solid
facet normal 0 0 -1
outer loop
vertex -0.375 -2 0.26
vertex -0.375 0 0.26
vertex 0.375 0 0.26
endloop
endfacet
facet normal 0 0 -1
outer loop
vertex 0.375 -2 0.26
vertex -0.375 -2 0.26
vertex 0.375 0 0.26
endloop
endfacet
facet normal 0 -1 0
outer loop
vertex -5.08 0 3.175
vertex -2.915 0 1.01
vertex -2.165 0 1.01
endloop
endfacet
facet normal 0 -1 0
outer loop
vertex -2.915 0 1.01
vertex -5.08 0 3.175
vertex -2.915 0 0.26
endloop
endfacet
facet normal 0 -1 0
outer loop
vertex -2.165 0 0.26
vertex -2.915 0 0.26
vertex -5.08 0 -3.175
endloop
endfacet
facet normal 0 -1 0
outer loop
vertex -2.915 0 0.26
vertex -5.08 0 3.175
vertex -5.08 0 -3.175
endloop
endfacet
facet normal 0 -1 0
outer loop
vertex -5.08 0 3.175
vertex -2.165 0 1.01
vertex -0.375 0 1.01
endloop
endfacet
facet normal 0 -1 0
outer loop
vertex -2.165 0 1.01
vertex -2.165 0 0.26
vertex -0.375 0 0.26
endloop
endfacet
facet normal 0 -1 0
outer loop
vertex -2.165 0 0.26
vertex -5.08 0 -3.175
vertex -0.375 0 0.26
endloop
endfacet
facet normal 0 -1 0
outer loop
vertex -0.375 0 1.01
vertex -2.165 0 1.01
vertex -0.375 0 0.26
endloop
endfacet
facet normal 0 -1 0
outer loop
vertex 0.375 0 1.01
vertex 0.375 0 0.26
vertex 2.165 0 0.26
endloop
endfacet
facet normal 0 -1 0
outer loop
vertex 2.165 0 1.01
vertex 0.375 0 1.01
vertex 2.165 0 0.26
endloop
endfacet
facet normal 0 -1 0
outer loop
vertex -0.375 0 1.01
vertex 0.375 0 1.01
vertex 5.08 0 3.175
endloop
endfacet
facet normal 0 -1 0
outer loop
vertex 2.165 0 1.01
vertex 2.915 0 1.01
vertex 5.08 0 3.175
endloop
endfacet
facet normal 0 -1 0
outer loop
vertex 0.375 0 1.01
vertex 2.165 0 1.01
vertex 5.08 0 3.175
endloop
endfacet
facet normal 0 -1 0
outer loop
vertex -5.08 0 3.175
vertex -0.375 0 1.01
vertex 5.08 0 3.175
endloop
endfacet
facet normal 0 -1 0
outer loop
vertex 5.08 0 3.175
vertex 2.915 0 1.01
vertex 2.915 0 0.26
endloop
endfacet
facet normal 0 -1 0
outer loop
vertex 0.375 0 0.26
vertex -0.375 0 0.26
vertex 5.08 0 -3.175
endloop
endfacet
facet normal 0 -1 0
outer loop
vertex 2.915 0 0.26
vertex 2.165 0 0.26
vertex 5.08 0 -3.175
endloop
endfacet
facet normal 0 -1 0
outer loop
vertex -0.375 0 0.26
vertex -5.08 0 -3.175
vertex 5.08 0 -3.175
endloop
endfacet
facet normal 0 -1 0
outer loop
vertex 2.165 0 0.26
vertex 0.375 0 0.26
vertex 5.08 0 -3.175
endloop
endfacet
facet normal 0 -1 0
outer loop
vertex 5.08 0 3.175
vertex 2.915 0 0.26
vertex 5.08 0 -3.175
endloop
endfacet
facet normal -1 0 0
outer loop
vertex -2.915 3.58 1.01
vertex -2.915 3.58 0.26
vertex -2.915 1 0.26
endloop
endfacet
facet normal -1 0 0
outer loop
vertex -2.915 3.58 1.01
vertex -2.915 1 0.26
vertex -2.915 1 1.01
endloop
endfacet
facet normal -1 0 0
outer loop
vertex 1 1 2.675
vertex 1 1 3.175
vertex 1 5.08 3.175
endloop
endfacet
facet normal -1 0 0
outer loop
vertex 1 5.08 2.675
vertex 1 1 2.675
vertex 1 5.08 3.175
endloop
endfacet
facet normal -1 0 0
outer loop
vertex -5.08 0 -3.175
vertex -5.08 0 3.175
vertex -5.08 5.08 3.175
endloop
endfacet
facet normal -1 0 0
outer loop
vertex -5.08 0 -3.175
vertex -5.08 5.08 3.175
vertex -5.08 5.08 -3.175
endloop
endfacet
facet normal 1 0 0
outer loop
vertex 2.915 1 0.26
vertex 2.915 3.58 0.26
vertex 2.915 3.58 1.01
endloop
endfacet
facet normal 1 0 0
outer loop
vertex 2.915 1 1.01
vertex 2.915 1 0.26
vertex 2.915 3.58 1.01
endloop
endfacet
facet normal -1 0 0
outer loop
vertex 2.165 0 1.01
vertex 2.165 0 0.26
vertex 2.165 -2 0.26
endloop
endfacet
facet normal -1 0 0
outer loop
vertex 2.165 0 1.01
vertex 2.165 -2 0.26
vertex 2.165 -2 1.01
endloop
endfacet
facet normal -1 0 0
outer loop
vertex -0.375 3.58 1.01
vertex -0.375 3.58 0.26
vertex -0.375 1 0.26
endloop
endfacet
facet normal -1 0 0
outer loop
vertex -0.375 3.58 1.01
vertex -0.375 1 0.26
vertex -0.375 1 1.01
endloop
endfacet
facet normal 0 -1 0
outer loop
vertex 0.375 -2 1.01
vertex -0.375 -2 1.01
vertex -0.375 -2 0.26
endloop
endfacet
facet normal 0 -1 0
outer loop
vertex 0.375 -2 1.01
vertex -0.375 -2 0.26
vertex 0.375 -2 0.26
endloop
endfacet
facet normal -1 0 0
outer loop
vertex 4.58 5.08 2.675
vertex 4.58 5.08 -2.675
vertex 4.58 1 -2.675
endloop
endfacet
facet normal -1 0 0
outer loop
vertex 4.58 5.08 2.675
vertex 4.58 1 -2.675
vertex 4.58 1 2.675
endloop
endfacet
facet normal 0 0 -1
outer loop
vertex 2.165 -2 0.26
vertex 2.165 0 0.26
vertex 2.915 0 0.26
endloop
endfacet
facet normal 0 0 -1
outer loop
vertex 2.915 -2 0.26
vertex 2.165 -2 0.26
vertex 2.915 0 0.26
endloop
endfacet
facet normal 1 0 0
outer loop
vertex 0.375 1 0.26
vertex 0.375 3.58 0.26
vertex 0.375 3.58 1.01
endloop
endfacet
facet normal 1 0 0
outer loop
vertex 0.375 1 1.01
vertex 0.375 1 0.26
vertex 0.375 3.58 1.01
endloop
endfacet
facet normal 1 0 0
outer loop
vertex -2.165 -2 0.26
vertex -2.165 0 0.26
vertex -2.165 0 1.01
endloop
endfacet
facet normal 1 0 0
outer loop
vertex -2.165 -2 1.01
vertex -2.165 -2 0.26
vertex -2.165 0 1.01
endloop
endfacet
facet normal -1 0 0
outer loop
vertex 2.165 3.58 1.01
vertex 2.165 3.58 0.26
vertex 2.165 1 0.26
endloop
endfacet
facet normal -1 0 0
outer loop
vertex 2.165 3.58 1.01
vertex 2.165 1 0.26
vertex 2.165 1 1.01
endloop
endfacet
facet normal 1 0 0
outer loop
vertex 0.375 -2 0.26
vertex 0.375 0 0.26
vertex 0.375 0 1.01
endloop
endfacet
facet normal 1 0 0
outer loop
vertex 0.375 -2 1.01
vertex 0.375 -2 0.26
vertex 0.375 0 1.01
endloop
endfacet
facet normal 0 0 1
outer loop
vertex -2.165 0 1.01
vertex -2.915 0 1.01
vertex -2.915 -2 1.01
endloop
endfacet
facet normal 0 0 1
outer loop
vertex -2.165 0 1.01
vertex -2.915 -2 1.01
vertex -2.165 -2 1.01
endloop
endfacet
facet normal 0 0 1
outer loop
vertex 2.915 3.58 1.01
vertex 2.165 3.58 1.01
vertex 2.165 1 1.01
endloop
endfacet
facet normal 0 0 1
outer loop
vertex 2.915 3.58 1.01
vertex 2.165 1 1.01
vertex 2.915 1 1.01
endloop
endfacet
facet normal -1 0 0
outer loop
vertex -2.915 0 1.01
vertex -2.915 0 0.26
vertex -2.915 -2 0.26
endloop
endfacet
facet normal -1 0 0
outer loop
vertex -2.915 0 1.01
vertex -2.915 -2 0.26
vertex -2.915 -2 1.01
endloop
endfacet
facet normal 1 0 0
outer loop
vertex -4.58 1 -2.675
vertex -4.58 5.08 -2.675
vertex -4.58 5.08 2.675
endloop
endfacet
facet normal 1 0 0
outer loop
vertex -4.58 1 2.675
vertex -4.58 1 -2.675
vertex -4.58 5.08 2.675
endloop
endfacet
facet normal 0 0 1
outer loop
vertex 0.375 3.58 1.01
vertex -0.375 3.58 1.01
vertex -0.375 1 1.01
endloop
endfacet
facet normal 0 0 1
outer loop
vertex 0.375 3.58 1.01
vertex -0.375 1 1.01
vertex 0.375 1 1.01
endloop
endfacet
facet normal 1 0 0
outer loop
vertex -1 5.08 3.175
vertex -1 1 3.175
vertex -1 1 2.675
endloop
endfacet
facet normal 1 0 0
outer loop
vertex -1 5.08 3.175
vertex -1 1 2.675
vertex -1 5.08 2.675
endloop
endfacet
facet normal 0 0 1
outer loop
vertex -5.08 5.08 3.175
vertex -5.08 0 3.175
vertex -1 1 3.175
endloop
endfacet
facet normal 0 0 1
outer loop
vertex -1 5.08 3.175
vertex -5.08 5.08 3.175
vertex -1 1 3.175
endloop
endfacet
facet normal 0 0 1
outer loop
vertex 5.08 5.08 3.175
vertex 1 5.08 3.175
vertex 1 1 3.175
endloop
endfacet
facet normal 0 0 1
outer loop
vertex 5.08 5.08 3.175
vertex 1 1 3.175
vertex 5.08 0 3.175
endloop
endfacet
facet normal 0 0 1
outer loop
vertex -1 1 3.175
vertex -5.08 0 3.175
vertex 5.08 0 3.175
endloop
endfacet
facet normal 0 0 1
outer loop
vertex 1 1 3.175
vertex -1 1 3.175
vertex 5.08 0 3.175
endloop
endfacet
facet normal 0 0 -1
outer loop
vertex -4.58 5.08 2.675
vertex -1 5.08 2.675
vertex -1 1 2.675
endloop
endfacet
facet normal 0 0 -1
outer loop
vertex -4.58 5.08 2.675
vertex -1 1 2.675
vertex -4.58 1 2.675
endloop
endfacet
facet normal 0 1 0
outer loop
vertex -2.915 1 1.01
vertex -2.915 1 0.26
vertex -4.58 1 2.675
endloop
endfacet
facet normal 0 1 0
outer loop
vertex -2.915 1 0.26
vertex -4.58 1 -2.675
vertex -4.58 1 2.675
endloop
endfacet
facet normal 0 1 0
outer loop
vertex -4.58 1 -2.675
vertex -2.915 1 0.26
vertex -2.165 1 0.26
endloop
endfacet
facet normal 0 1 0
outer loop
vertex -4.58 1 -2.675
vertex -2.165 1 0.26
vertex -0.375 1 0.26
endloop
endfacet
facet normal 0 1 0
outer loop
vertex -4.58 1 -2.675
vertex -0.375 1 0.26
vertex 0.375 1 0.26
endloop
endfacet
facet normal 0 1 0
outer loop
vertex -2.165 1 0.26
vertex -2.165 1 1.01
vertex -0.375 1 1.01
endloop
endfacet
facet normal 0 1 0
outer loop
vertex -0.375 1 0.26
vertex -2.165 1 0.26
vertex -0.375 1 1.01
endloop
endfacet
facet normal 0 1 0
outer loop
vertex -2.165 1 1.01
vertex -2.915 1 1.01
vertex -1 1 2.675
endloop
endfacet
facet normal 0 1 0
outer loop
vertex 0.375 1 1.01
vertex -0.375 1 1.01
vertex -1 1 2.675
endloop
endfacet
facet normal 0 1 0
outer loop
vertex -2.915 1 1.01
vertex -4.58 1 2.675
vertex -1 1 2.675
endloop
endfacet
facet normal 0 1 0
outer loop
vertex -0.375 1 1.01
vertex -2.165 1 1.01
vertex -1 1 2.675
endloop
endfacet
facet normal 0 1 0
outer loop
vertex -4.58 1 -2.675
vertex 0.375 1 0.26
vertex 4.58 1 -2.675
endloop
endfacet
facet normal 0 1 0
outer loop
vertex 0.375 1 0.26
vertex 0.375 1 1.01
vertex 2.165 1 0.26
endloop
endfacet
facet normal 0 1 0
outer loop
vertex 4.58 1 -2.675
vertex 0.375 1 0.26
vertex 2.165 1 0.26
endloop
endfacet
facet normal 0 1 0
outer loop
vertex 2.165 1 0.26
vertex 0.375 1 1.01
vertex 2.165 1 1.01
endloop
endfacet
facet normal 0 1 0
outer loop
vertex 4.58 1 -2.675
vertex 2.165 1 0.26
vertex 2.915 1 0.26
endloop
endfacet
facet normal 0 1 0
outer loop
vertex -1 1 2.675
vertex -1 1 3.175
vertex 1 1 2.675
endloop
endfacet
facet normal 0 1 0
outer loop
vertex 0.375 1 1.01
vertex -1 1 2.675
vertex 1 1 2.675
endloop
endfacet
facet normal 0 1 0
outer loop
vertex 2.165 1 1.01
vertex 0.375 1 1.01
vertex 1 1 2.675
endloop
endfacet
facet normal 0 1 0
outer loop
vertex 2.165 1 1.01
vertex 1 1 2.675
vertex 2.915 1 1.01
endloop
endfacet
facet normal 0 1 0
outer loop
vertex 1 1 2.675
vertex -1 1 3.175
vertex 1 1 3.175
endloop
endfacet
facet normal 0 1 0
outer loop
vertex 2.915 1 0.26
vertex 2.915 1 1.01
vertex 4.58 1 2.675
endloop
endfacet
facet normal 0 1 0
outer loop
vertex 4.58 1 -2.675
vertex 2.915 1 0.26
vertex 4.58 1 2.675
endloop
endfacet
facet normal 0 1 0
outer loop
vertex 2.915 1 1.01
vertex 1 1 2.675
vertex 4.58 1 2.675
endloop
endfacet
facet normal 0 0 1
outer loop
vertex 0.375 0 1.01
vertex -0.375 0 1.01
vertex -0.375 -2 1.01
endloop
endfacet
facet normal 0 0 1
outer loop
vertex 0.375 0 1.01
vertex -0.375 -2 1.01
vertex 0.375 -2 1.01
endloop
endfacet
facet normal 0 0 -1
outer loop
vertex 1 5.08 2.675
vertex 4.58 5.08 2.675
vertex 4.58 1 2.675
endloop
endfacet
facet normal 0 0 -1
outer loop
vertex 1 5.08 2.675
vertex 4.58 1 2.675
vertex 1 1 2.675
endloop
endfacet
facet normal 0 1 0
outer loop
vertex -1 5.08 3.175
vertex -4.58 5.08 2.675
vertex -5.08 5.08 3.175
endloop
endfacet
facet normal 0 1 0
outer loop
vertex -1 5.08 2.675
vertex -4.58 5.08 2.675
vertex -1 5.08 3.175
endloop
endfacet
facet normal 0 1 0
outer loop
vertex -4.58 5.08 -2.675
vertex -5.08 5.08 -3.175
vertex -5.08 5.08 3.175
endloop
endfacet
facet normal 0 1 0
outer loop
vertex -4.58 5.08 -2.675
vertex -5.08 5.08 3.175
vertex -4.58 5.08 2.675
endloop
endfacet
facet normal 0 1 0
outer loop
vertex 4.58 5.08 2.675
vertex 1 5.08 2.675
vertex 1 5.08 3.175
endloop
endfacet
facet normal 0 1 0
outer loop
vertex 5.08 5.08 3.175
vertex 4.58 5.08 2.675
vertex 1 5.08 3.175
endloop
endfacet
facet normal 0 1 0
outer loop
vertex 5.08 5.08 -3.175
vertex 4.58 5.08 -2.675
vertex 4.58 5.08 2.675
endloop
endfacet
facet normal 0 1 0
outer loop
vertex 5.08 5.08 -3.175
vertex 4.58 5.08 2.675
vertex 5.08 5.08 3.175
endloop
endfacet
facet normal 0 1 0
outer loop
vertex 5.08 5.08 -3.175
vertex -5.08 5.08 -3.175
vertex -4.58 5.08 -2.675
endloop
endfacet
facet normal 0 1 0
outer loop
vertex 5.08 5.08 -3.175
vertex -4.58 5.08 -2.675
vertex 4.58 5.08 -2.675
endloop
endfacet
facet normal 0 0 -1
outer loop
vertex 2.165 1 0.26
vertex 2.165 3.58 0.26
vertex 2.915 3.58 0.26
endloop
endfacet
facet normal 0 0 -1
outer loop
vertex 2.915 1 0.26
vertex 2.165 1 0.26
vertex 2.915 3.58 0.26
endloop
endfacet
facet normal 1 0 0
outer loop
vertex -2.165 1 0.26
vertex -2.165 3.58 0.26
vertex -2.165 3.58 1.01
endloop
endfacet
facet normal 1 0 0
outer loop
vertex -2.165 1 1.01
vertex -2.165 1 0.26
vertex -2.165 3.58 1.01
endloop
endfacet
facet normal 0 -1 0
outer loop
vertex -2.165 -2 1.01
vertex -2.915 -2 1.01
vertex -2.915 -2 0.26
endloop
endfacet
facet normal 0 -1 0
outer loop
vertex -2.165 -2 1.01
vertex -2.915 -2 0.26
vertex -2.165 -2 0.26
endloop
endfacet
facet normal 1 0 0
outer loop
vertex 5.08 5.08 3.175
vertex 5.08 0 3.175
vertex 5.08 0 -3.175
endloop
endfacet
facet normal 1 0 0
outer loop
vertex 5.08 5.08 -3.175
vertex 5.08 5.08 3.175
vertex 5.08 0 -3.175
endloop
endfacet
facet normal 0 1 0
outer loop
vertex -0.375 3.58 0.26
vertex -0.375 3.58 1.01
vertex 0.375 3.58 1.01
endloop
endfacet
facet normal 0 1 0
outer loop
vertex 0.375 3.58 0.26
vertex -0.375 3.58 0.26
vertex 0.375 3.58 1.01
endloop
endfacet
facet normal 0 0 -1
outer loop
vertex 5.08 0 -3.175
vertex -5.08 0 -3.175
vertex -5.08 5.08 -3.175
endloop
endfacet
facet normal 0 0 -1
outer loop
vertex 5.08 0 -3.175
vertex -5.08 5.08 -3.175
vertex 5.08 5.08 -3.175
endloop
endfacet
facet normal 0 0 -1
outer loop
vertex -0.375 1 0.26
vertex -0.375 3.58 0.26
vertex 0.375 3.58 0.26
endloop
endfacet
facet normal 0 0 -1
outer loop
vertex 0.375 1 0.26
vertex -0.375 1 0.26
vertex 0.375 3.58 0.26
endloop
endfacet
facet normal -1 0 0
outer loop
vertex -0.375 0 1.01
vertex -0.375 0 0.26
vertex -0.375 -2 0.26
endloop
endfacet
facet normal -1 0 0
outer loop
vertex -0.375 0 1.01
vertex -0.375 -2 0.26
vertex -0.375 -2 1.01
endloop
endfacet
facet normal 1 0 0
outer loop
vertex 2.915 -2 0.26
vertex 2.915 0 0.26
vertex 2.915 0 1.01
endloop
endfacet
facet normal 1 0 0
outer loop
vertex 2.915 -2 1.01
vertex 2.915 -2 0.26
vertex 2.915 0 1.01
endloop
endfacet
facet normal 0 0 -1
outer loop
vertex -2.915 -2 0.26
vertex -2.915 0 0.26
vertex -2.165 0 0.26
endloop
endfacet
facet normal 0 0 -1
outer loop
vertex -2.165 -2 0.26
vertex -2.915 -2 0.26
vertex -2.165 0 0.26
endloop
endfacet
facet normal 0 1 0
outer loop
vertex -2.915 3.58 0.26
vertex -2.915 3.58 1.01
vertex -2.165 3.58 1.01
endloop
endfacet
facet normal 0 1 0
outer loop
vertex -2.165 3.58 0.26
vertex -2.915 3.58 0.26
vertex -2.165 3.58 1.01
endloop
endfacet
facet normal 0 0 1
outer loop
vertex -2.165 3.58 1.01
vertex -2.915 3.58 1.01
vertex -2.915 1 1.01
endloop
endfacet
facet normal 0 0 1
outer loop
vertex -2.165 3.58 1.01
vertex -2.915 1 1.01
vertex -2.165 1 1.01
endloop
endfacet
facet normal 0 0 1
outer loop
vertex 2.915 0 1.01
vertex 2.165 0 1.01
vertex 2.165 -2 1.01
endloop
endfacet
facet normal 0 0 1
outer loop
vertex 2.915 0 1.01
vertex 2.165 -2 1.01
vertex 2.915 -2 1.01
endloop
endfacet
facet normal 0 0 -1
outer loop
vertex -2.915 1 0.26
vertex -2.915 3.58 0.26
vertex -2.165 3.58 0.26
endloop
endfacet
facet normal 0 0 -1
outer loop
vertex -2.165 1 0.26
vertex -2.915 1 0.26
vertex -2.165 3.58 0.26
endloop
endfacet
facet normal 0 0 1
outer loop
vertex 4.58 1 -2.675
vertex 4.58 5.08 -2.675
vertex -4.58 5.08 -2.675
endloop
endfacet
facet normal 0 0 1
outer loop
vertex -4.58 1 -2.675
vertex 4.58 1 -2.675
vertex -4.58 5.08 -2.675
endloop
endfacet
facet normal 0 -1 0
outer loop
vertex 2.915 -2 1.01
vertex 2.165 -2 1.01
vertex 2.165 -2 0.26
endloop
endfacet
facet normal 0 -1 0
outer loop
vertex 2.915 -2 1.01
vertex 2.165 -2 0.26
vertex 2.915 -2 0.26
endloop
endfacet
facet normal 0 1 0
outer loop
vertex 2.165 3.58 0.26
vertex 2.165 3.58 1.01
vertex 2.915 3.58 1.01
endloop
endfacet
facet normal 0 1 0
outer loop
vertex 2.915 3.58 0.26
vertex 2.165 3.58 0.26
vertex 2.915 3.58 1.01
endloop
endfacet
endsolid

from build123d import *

# Parameters (mm, degrees)
SKETCH_1_W           = 10.16
SKETCH_1_H           = 6.35
EXTRUDE_1_DEPTH      = 5.08
SKETCH_2_W           = 9.16
SKETCH_2_H           = 5.35
CUT_EXTRUDE_1_DEPTH  = 4.08
SKETCH_3_W           = 2
SKETCH_3_H           = 4.08
CUT_EXTRUDE_2_DEPTH  = 1
EXTRUDE_2_DEPTH      = 2
EXTRUDE_2_DEPTH_BACK = 3.58
SKETCH_4_W           = 0.75
SKETCH_4_H           = 0.75


with BuildPart() as part:
    # 草图1 → 拉伸1 (new body)
    with BuildSketch(Plane(origin=(0, 0, 0), x_dir=(1, 0, 0), z_dir=(0, 1, 0))):
        Rectangle(SKETCH_1_W, SKETCH_1_H)
    extrude(amount=EXTRUDE_1_DEPTH)

    # 草图2 → 切除-拉伸1 (cut)
    with BuildSketch(Plane(origin=(0, 5.08, 0), x_dir=(-1, 0, 0), z_dir=(0, 1, 0))):
        Rectangle(SKETCH_2_W, SKETCH_2_H)
    extrude(amount=-CUT_EXTRUDE_1_DEPTH, mode=Mode.SUBTRACT)

    # 草图3 → 切除-拉伸2 (cut)
    with BuildSketch(Plane.XY.offset(3.175)):
        with Locations((0, 3.04)):
            Rectangle(SKETCH_3_W, SKETCH_3_H)
    extrude(amount=-CUT_EXTRUDE_2_DEPTH, mode=Mode.SUBTRACT)

    # 草图4 → 拉伸2 (add, two sides: drawn at the far end of the back side and taken through both)
    with BuildSketch(Plane.XZ.offset(-EXTRUDE_2_DEPTH_BACK)):
        with Locations((0, 0.635)):
            Rectangle(SKETCH_4_W, SKETCH_4_H)
        with Locations((2.54, 0.635)):
            Rectangle(SKETCH_4_W, SKETCH_4_H)
        with Locations((-2.54, 0.635)):
            Rectangle(SKETCH_4_W, SKETCH_4_H)
    extrude(amount=EXTRUDE_2_DEPTH + EXTRUDE_2_DEPTH_BACK)


solid = part.part
